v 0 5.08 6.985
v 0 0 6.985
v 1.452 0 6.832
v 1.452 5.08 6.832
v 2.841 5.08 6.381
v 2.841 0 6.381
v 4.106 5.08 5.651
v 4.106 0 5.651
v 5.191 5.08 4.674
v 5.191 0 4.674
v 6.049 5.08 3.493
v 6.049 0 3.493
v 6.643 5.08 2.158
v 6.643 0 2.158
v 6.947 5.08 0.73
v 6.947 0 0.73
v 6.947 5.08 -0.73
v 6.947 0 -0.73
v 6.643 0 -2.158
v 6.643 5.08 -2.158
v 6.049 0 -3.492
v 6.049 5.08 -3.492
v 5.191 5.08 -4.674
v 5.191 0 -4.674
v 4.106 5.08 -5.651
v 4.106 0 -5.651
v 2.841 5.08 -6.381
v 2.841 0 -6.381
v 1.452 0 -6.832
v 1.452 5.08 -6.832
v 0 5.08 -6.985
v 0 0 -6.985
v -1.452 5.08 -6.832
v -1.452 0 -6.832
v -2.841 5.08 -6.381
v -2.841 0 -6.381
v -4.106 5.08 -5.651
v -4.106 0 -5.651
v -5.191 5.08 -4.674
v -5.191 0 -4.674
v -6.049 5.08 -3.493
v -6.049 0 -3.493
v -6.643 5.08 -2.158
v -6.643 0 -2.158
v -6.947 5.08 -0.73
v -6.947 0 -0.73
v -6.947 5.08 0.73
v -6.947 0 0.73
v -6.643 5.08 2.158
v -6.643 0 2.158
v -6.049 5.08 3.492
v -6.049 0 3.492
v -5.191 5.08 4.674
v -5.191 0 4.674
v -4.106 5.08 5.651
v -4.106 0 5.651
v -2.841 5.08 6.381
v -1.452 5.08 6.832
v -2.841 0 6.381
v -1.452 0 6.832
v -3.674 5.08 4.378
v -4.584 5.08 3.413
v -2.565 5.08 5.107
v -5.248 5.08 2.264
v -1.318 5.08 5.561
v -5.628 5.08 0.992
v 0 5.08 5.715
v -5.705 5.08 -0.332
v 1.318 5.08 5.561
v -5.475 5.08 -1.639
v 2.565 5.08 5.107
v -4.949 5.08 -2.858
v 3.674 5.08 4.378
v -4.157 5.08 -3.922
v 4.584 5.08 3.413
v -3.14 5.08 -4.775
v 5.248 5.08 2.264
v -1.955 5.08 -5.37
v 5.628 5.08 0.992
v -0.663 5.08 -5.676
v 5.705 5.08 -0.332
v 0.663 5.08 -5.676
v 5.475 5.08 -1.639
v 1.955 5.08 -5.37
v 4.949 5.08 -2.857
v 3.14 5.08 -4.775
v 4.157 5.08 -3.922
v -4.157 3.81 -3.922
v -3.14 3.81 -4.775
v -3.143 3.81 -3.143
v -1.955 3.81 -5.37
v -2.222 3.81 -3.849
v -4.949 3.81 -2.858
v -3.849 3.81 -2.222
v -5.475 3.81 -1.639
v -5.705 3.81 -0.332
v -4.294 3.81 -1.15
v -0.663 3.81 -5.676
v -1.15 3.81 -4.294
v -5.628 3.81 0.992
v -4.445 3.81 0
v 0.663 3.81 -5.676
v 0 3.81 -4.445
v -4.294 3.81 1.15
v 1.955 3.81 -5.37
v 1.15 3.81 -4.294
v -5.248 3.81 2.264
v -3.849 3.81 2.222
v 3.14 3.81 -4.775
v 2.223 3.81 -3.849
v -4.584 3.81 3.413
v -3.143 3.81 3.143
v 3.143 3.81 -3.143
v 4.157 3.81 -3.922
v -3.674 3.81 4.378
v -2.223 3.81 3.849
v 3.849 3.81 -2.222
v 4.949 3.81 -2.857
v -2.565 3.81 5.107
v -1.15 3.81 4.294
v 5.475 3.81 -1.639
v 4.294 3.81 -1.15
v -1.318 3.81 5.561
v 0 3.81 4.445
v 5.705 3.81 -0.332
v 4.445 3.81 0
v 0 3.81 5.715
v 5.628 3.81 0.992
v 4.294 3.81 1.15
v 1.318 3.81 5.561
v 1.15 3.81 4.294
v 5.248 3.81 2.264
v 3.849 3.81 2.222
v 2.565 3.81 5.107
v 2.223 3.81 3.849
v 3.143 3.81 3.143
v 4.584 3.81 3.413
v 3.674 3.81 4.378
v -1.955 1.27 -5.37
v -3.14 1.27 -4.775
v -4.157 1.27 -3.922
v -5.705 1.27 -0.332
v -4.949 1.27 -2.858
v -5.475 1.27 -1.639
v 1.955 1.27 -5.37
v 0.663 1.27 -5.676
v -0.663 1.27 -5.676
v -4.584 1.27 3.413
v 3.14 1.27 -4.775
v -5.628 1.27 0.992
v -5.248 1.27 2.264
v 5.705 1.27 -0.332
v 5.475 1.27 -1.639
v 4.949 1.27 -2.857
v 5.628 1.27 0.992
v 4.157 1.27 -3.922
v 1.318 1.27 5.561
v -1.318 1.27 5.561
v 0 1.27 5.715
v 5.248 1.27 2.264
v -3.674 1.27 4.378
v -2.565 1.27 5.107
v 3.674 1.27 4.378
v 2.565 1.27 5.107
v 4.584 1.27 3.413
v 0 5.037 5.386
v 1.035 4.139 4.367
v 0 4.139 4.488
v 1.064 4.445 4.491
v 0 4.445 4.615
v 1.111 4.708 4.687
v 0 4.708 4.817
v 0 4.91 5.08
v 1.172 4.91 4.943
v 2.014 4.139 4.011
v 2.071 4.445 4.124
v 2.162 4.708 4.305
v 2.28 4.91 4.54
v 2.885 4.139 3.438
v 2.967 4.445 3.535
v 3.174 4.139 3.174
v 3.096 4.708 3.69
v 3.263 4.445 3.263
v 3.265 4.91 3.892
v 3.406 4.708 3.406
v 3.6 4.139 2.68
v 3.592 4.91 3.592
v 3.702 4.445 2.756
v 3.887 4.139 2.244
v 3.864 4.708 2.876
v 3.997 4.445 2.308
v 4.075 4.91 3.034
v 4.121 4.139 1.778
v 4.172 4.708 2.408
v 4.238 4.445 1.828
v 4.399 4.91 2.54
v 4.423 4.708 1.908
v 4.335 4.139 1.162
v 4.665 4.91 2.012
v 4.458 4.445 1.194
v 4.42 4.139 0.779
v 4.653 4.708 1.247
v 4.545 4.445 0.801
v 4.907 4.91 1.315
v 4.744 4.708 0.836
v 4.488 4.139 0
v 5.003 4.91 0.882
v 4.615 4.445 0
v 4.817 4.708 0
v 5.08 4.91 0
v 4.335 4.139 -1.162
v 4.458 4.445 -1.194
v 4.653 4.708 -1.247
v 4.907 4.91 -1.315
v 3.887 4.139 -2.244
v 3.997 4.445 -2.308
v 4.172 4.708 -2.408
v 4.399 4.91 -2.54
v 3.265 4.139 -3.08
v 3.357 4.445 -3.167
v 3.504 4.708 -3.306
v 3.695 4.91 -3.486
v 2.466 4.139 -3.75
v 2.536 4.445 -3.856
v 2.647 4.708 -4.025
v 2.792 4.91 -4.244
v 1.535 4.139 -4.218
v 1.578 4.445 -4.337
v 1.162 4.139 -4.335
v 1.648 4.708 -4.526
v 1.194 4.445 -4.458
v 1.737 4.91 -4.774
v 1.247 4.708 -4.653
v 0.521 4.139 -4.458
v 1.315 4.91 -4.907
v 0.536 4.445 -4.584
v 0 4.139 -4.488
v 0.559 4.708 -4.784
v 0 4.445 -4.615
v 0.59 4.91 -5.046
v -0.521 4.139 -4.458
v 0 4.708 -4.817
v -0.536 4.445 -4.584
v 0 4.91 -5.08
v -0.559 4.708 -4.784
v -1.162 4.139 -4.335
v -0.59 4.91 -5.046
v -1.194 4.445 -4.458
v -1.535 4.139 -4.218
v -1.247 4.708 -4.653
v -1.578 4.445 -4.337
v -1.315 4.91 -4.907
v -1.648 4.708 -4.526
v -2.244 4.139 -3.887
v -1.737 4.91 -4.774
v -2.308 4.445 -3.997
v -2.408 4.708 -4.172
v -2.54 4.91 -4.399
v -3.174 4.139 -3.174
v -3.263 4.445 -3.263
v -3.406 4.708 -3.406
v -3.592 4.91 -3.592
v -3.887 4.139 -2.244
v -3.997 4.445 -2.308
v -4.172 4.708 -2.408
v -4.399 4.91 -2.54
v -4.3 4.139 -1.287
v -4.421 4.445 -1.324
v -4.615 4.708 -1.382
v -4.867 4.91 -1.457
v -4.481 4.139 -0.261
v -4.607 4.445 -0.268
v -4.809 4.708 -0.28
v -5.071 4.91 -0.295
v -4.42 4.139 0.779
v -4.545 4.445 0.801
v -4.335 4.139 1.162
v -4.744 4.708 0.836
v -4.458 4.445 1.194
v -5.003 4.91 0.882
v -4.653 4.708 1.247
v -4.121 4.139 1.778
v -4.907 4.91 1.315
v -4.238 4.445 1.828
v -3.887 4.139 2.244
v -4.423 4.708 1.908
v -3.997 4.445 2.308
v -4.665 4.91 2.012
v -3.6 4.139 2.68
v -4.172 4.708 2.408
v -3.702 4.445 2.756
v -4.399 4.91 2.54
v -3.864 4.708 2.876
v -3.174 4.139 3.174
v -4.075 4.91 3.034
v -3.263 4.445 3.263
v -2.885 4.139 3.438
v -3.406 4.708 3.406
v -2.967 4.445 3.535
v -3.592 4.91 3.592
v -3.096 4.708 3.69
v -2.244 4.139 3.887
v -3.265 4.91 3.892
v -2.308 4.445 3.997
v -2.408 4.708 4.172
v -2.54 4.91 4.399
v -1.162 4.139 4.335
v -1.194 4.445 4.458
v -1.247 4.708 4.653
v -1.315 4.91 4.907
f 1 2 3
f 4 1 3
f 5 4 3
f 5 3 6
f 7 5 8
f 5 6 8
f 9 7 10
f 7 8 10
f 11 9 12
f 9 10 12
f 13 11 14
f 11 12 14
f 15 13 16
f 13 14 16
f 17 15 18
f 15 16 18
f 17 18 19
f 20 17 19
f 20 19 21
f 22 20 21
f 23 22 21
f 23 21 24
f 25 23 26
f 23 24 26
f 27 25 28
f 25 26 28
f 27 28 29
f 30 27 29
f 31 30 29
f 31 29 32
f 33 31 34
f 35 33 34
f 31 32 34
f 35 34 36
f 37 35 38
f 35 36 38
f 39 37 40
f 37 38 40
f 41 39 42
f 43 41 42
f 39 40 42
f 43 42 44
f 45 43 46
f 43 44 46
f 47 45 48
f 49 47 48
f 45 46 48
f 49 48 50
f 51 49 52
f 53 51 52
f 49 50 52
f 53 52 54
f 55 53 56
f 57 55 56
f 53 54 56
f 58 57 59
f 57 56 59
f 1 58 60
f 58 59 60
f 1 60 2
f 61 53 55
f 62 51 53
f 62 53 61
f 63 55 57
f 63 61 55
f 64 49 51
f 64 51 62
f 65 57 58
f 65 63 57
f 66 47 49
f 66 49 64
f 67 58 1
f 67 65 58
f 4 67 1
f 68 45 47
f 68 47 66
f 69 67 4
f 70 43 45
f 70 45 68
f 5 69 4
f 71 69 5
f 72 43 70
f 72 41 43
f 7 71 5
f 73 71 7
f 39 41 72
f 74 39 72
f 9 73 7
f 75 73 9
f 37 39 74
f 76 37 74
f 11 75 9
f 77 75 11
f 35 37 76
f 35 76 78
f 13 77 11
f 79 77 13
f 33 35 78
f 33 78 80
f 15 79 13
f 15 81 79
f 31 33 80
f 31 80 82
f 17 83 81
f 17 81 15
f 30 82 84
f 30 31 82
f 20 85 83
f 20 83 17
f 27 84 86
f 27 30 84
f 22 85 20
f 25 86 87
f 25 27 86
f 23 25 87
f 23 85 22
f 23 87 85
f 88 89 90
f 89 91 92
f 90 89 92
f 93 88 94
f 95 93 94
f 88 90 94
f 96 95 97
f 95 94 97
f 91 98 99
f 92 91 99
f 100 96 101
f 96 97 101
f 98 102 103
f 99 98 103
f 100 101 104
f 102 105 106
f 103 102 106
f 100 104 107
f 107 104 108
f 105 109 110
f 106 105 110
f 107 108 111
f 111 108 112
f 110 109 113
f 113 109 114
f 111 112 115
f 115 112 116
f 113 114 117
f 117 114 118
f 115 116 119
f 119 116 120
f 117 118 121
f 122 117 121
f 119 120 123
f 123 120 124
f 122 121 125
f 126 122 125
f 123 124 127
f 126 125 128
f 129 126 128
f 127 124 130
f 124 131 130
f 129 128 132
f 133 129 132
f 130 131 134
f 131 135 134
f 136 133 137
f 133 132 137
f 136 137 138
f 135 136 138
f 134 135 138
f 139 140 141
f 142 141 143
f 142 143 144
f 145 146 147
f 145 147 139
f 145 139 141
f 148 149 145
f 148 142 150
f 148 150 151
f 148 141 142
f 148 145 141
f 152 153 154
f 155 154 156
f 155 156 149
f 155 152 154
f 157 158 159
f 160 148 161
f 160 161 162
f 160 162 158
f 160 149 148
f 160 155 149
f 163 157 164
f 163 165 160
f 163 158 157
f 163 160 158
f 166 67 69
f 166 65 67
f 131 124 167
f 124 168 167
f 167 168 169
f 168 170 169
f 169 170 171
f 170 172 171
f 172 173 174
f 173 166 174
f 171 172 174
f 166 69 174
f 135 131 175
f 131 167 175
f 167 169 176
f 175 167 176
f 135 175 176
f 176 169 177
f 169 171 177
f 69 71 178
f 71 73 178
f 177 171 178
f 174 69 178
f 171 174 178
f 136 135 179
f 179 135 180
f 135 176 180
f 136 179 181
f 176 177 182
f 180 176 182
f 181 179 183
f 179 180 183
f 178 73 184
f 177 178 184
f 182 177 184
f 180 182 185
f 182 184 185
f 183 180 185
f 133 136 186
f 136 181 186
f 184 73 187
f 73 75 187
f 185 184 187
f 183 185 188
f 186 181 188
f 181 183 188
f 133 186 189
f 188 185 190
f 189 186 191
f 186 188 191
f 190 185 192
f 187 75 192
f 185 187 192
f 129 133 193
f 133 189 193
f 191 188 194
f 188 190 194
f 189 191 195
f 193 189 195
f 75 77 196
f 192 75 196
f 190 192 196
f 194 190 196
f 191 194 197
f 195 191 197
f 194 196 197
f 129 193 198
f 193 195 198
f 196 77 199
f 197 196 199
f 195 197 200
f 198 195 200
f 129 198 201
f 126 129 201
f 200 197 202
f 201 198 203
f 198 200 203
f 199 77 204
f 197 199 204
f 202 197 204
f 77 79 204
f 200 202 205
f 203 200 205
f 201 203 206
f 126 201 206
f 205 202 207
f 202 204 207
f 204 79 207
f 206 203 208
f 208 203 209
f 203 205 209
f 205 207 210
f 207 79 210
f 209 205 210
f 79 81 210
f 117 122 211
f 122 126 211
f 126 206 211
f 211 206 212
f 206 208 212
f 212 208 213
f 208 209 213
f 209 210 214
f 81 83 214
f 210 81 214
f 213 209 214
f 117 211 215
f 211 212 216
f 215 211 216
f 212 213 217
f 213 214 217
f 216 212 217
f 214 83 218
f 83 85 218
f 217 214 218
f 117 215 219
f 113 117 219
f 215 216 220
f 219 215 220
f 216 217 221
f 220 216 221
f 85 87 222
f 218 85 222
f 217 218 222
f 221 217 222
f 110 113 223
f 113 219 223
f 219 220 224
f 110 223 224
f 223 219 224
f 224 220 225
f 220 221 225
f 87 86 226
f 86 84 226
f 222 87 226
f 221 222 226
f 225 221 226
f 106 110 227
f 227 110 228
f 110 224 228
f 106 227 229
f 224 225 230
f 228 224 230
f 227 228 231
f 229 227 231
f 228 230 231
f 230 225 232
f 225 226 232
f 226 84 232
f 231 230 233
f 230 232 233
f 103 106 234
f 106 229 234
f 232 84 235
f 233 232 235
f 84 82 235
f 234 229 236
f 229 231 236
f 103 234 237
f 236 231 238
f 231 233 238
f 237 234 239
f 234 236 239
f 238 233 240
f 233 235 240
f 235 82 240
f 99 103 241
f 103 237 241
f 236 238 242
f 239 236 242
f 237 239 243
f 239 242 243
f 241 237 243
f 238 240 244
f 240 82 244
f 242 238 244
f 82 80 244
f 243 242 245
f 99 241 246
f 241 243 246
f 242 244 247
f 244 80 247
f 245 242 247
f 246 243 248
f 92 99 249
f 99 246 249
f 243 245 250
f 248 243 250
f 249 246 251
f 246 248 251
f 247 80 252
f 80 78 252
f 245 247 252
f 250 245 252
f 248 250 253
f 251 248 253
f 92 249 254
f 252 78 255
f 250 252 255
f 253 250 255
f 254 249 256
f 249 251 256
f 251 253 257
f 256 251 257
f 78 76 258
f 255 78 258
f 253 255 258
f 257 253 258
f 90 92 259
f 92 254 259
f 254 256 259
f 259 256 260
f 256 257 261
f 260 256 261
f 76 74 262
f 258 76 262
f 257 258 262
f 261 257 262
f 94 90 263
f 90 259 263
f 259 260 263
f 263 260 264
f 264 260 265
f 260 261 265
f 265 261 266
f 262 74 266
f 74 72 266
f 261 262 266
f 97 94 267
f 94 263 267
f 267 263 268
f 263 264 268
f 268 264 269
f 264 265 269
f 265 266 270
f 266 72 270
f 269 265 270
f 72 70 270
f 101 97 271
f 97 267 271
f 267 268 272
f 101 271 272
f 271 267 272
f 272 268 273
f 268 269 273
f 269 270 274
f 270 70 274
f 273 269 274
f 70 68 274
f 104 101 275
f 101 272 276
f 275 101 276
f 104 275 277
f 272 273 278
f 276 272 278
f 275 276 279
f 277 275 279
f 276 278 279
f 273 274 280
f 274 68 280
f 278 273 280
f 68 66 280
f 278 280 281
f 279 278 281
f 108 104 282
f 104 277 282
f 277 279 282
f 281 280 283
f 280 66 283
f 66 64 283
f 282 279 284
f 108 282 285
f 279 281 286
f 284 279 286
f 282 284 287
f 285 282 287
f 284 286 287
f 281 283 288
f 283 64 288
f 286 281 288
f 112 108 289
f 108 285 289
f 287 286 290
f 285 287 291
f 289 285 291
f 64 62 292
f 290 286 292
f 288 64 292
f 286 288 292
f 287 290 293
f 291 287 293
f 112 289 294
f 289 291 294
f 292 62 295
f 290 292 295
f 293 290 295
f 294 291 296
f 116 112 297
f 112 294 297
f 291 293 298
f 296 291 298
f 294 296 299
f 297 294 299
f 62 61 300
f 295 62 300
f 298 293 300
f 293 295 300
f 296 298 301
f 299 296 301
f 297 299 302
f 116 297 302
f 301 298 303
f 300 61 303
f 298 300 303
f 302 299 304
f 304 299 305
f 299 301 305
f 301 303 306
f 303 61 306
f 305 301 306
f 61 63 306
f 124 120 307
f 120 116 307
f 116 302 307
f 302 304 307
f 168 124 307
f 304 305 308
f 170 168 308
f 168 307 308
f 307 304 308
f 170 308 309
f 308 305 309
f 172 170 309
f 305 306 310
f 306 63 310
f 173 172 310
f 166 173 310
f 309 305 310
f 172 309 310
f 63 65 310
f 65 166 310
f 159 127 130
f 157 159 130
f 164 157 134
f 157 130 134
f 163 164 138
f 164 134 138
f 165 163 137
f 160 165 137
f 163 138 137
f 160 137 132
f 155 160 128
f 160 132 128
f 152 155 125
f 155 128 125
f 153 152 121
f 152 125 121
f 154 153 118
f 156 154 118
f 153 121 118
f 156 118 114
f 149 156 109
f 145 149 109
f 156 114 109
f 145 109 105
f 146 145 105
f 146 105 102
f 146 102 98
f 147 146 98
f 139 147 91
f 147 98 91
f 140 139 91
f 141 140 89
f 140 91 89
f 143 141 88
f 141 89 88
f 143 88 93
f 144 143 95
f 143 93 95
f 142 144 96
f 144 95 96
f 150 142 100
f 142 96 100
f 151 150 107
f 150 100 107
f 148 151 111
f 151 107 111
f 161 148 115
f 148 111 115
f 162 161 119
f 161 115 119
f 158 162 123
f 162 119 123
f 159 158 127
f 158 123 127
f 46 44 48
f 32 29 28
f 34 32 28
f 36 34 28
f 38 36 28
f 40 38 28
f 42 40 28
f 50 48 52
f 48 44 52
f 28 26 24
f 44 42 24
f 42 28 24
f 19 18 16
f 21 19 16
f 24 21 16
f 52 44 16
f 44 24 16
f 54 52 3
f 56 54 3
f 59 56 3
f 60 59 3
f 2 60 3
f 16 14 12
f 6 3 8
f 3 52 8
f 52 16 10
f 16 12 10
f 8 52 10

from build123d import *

# Parameters (mm, degrees)
SKETCH1_R           = 6.985
BOSS_EXTRUDE1_DEPTH = 5.08
SKETCH3_R           = 5.08
CUT_EXTRUDE1_DEPTH  = 3.81
SKETCH4_R           = 5.08
SKETCH4_R_2         = 4.445
BOSS_EXTRUDE4_DEPTH = 3.81
FILLET2_R           = 1.27
CUT_EXTRUDE2_START  = 2.54
SKETCH5_R           = 5.715
SKETCH5_R_2         = 4.445
CUT_EXTRUDE2_DEPTH  = 2.54


with BuildPart() as part:
    # Sketch1 → Boss-Extrude1 (new body)
    with BuildSketch(Plane(origin=(0, 0, 0), x_dir=(1, 0, 0), z_dir=(0, 1, 0))):
        with Locations(Location((0, 0, 0), (0, 0, 270))):
            Circle(SKETCH1_R)
    extrude(amount=BOSS_EXTRUDE1_DEPTH)

    # Sketch3 → Cut-Extrude1 (cut)
    with BuildSketch(Plane(origin=(0, 5.08, 0), x_dir=(1, 0, 0), z_dir=(0, 1, 0))):
        with Locations(Location((0, 0, 0), (0, 0, 270))):
            Circle(SKETCH3_R)
    extrude(amount=-CUT_EXTRUDE1_DEPTH, mode=Mode.SUBTRACT)

    # Sketch4 → Boss-Extrude4 (add)
    with BuildSketch(Plane(origin=(0, 5.08, 0), x_dir=(1, 0, 0), z_dir=(0, 1, 0))):
        Circle(SKETCH4_R)
        with Locations(Location((0, 0, 0), (0, 0, 270))):
            Circle(SKETCH4_R_2, mode=Mode.SUBTRACT)
    extrude(amount=-BOSS_EXTRUDE4_DEPTH)

    # Fillet2
    fillet2_edges = [part.edges().sort_by_distance(p)[0] for p in [
        (0, 5.08, -4.445),
    ]]
    fillet(fillet2_edges, radius=FILLET2_R)

    # Sketch5 → Cut-Extrude2 (cut)
    with BuildSketch(Plane(origin=(0, 1.27, 0), x_dir=(1, 0, 0), z_dir=(0, 1, 0)).offset(CUT_EXTRUDE2_START)):
        with Locations(Location((0, 0, 0), (0, 0, 270))):
            Circle(SKETCH5_R)
        Circle(SKETCH5_R_2, mode=Mode.SUBTRACT)
    extrude(amount=-CUT_EXTRUDE2_DEPTH, mode=Mode.SUBTRACT)


solid = part.part
